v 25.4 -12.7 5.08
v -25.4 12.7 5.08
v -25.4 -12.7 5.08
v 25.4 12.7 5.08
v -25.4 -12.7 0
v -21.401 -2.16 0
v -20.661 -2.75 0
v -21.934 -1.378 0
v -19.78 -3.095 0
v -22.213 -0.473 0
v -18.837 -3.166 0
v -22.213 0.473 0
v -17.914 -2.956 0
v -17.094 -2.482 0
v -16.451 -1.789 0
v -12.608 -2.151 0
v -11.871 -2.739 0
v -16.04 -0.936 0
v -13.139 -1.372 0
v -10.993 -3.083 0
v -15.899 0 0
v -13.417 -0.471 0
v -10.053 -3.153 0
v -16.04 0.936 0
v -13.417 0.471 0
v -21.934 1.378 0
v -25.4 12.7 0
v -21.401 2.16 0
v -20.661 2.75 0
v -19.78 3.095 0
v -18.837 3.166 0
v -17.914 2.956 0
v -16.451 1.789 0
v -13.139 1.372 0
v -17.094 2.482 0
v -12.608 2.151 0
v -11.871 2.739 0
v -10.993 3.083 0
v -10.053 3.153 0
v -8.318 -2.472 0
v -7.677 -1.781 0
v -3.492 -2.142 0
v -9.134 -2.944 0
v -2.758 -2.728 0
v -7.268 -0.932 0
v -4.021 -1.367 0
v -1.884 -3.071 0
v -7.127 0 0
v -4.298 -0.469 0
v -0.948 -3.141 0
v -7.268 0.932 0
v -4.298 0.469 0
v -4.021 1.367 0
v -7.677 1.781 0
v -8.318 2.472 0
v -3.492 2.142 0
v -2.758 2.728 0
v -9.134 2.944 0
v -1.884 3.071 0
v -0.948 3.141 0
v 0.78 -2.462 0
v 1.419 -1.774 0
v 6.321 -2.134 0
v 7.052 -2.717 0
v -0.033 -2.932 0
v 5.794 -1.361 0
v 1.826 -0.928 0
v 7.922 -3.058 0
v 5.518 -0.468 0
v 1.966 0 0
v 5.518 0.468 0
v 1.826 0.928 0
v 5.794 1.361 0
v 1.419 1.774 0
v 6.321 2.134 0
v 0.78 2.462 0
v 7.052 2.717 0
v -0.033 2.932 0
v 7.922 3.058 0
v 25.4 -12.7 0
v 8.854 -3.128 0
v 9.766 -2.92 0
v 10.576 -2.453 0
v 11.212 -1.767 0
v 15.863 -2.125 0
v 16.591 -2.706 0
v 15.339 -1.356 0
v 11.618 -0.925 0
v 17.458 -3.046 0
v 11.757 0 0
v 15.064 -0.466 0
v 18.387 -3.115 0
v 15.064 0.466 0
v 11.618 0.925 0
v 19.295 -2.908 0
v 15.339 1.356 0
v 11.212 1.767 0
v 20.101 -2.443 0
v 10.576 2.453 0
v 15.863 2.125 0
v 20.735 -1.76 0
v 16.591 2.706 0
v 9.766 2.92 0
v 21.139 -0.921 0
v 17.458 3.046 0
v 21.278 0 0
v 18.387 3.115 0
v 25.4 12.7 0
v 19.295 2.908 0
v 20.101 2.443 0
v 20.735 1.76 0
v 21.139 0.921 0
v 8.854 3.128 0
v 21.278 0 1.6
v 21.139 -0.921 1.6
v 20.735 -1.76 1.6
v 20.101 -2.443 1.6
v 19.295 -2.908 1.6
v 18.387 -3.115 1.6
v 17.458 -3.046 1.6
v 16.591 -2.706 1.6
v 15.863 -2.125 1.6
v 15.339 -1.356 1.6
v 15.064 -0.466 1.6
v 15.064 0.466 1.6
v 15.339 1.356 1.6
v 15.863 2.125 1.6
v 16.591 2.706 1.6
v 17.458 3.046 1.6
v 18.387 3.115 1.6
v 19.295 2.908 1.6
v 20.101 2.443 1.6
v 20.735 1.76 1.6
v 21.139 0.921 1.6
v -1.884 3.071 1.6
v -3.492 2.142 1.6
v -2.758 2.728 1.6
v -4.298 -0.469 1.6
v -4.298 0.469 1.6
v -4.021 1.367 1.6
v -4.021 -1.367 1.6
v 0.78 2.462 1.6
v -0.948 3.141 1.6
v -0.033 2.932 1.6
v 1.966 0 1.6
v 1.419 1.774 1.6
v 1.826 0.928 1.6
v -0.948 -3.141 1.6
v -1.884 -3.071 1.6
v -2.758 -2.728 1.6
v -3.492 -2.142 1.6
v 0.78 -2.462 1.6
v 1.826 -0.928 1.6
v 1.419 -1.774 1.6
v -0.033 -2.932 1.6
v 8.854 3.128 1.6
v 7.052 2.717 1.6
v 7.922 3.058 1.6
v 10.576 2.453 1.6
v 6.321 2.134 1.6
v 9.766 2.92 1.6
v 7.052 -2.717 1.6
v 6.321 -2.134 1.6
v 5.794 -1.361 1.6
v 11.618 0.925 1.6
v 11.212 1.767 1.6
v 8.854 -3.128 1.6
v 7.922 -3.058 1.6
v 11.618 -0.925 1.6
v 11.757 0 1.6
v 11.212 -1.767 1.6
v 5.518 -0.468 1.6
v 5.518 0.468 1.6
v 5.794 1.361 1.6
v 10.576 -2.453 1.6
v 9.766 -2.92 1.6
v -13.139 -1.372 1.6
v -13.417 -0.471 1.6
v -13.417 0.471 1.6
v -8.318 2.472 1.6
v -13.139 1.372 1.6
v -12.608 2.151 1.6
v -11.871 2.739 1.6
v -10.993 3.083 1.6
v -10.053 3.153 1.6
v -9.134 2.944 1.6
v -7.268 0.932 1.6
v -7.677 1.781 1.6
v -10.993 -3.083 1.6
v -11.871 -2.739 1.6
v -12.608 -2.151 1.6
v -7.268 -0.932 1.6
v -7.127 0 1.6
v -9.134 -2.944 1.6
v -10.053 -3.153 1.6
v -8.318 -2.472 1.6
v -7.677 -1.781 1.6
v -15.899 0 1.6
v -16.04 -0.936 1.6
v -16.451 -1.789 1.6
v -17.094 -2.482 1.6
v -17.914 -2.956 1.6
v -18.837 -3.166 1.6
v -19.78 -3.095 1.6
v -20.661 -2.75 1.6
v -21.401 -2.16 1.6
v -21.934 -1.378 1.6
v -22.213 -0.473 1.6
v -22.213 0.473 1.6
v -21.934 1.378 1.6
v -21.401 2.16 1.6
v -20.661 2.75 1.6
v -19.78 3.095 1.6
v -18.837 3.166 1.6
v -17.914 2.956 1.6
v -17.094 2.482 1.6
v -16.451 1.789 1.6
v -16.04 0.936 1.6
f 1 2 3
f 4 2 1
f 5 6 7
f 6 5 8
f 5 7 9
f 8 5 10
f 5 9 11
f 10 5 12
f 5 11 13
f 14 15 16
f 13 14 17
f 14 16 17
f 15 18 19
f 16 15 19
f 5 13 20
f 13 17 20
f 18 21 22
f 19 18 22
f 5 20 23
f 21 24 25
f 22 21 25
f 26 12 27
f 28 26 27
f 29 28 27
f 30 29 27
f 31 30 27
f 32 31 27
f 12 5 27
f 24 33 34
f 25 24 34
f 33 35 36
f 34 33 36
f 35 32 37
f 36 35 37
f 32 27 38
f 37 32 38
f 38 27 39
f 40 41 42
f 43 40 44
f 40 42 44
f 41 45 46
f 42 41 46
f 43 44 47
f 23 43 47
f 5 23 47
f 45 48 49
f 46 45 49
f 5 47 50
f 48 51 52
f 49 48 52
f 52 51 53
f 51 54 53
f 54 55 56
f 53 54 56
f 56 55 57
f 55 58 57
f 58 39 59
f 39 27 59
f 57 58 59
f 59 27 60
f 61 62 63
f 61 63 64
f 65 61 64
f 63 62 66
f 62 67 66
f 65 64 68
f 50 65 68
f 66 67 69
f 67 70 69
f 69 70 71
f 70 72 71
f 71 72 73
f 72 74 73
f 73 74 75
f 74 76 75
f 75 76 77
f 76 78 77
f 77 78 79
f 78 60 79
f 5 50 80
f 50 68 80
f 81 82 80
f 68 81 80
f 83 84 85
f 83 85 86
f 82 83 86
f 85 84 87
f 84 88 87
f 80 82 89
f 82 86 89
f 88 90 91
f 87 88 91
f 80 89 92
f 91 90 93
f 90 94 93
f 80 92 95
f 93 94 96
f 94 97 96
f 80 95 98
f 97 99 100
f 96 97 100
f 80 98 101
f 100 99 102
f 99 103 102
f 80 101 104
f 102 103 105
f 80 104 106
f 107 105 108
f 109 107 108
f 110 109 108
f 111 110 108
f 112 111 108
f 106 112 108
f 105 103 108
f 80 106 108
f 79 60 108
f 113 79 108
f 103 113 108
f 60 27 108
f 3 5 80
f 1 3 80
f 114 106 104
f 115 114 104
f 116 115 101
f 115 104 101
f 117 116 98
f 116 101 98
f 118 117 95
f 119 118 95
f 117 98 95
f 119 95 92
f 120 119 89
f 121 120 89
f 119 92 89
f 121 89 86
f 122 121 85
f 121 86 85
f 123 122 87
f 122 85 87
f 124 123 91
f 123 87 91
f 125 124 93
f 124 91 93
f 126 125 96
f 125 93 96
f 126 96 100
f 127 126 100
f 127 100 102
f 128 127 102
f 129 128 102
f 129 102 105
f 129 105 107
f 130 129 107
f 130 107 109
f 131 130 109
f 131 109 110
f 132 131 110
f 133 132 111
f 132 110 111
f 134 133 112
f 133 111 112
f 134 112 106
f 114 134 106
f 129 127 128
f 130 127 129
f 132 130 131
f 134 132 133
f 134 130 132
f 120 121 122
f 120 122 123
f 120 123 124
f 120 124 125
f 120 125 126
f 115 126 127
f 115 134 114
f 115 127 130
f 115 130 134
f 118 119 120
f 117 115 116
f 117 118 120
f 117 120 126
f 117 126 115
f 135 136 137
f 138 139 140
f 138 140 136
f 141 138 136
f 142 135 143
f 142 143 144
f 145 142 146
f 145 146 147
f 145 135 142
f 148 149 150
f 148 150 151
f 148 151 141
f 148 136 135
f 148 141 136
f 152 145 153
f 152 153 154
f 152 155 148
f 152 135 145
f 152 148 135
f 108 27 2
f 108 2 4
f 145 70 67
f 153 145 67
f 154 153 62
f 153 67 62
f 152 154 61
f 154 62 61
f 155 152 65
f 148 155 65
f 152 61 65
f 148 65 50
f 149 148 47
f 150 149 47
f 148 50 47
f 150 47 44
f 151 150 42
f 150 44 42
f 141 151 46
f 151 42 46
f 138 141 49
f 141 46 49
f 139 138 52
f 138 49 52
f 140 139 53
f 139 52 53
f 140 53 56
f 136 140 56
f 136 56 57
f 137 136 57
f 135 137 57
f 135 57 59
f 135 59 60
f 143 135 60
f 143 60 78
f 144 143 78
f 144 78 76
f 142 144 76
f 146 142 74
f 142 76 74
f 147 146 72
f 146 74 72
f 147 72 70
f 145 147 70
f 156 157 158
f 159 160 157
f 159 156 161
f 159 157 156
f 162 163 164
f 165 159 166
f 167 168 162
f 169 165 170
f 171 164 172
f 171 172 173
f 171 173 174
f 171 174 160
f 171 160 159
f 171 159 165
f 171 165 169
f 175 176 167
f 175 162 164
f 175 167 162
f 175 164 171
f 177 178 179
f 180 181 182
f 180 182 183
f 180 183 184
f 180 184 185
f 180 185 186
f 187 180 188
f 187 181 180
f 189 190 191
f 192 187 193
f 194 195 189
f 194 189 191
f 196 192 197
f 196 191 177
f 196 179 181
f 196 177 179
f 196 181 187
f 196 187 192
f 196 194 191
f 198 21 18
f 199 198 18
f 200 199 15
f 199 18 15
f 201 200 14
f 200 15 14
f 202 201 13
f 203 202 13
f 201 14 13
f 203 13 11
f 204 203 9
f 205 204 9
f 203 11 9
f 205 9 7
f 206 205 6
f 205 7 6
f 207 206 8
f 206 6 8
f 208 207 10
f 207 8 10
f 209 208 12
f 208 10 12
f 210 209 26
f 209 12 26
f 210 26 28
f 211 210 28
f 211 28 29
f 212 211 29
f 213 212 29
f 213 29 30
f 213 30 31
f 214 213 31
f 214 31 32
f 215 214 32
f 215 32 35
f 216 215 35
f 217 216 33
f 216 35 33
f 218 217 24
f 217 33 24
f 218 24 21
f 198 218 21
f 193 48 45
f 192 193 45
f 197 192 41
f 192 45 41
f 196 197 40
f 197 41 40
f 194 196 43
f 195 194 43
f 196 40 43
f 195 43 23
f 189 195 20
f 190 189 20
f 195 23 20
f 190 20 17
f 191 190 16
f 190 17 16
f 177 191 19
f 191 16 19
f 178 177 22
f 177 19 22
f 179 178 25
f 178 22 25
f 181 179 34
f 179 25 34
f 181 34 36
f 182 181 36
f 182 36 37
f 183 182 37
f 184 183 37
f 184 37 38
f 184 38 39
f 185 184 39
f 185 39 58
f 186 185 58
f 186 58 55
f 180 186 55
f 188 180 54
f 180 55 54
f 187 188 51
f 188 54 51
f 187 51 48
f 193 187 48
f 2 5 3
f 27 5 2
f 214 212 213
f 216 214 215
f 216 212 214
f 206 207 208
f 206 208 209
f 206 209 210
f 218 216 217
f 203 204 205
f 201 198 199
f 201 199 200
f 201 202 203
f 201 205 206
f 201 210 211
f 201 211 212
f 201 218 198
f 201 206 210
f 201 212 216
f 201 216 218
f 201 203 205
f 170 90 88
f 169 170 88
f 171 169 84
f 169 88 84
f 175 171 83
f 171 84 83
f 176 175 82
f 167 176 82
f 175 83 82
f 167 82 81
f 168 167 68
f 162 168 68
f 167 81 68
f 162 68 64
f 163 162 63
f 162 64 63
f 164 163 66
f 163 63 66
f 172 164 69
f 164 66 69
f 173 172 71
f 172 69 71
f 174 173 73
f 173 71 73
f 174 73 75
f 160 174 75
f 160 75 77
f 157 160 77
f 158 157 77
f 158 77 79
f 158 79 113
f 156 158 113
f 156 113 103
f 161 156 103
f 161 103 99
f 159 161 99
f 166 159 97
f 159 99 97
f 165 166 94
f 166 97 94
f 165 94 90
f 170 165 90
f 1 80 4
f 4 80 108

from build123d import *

# Parameters (mm, degrees)
F0_W     = 50.8
F0_H     = 25.4
F1_DEPTH = 5.08
F2_R     = 3.175
F2_R_2   = 3.1623
F2_R_3   = 3.1496
F2_R_4   = 3.1369
F2_R_5   = 3.1242
F3_DEPTH = 1.6002


with BuildPart() as f1:
    # F0 (on Top) → F1 (new body)
    with BuildSketch(Plane.XY):
        Rectangle(F0_W, F0_H)
    extrude(amount=F1_DEPTH)

    # F2 (on face) → F3 (cut)
    with BuildSketch(Plane(origin=(0, 0, 0), x_dir=(1, 0, 0), z_dir=(0, 0, -1))):
        with Locations((-19.073904, 0)):
            Circle(F2_R)
        with Locations((-10.289737, 0)):
            Circle(F2_R_2)
        with Locations((-1.183511, 0)):
            Circle(F2_R_3)
        with Locations((8.620071, 0)):
            Circle(F2_R_4)
        with Locations((18.153338, 0)):
            Circle(F2_R_5)
    extrude(amount=-F3_DEPTH, mode=Mode.SUBTRACT)


solid = f1.part
